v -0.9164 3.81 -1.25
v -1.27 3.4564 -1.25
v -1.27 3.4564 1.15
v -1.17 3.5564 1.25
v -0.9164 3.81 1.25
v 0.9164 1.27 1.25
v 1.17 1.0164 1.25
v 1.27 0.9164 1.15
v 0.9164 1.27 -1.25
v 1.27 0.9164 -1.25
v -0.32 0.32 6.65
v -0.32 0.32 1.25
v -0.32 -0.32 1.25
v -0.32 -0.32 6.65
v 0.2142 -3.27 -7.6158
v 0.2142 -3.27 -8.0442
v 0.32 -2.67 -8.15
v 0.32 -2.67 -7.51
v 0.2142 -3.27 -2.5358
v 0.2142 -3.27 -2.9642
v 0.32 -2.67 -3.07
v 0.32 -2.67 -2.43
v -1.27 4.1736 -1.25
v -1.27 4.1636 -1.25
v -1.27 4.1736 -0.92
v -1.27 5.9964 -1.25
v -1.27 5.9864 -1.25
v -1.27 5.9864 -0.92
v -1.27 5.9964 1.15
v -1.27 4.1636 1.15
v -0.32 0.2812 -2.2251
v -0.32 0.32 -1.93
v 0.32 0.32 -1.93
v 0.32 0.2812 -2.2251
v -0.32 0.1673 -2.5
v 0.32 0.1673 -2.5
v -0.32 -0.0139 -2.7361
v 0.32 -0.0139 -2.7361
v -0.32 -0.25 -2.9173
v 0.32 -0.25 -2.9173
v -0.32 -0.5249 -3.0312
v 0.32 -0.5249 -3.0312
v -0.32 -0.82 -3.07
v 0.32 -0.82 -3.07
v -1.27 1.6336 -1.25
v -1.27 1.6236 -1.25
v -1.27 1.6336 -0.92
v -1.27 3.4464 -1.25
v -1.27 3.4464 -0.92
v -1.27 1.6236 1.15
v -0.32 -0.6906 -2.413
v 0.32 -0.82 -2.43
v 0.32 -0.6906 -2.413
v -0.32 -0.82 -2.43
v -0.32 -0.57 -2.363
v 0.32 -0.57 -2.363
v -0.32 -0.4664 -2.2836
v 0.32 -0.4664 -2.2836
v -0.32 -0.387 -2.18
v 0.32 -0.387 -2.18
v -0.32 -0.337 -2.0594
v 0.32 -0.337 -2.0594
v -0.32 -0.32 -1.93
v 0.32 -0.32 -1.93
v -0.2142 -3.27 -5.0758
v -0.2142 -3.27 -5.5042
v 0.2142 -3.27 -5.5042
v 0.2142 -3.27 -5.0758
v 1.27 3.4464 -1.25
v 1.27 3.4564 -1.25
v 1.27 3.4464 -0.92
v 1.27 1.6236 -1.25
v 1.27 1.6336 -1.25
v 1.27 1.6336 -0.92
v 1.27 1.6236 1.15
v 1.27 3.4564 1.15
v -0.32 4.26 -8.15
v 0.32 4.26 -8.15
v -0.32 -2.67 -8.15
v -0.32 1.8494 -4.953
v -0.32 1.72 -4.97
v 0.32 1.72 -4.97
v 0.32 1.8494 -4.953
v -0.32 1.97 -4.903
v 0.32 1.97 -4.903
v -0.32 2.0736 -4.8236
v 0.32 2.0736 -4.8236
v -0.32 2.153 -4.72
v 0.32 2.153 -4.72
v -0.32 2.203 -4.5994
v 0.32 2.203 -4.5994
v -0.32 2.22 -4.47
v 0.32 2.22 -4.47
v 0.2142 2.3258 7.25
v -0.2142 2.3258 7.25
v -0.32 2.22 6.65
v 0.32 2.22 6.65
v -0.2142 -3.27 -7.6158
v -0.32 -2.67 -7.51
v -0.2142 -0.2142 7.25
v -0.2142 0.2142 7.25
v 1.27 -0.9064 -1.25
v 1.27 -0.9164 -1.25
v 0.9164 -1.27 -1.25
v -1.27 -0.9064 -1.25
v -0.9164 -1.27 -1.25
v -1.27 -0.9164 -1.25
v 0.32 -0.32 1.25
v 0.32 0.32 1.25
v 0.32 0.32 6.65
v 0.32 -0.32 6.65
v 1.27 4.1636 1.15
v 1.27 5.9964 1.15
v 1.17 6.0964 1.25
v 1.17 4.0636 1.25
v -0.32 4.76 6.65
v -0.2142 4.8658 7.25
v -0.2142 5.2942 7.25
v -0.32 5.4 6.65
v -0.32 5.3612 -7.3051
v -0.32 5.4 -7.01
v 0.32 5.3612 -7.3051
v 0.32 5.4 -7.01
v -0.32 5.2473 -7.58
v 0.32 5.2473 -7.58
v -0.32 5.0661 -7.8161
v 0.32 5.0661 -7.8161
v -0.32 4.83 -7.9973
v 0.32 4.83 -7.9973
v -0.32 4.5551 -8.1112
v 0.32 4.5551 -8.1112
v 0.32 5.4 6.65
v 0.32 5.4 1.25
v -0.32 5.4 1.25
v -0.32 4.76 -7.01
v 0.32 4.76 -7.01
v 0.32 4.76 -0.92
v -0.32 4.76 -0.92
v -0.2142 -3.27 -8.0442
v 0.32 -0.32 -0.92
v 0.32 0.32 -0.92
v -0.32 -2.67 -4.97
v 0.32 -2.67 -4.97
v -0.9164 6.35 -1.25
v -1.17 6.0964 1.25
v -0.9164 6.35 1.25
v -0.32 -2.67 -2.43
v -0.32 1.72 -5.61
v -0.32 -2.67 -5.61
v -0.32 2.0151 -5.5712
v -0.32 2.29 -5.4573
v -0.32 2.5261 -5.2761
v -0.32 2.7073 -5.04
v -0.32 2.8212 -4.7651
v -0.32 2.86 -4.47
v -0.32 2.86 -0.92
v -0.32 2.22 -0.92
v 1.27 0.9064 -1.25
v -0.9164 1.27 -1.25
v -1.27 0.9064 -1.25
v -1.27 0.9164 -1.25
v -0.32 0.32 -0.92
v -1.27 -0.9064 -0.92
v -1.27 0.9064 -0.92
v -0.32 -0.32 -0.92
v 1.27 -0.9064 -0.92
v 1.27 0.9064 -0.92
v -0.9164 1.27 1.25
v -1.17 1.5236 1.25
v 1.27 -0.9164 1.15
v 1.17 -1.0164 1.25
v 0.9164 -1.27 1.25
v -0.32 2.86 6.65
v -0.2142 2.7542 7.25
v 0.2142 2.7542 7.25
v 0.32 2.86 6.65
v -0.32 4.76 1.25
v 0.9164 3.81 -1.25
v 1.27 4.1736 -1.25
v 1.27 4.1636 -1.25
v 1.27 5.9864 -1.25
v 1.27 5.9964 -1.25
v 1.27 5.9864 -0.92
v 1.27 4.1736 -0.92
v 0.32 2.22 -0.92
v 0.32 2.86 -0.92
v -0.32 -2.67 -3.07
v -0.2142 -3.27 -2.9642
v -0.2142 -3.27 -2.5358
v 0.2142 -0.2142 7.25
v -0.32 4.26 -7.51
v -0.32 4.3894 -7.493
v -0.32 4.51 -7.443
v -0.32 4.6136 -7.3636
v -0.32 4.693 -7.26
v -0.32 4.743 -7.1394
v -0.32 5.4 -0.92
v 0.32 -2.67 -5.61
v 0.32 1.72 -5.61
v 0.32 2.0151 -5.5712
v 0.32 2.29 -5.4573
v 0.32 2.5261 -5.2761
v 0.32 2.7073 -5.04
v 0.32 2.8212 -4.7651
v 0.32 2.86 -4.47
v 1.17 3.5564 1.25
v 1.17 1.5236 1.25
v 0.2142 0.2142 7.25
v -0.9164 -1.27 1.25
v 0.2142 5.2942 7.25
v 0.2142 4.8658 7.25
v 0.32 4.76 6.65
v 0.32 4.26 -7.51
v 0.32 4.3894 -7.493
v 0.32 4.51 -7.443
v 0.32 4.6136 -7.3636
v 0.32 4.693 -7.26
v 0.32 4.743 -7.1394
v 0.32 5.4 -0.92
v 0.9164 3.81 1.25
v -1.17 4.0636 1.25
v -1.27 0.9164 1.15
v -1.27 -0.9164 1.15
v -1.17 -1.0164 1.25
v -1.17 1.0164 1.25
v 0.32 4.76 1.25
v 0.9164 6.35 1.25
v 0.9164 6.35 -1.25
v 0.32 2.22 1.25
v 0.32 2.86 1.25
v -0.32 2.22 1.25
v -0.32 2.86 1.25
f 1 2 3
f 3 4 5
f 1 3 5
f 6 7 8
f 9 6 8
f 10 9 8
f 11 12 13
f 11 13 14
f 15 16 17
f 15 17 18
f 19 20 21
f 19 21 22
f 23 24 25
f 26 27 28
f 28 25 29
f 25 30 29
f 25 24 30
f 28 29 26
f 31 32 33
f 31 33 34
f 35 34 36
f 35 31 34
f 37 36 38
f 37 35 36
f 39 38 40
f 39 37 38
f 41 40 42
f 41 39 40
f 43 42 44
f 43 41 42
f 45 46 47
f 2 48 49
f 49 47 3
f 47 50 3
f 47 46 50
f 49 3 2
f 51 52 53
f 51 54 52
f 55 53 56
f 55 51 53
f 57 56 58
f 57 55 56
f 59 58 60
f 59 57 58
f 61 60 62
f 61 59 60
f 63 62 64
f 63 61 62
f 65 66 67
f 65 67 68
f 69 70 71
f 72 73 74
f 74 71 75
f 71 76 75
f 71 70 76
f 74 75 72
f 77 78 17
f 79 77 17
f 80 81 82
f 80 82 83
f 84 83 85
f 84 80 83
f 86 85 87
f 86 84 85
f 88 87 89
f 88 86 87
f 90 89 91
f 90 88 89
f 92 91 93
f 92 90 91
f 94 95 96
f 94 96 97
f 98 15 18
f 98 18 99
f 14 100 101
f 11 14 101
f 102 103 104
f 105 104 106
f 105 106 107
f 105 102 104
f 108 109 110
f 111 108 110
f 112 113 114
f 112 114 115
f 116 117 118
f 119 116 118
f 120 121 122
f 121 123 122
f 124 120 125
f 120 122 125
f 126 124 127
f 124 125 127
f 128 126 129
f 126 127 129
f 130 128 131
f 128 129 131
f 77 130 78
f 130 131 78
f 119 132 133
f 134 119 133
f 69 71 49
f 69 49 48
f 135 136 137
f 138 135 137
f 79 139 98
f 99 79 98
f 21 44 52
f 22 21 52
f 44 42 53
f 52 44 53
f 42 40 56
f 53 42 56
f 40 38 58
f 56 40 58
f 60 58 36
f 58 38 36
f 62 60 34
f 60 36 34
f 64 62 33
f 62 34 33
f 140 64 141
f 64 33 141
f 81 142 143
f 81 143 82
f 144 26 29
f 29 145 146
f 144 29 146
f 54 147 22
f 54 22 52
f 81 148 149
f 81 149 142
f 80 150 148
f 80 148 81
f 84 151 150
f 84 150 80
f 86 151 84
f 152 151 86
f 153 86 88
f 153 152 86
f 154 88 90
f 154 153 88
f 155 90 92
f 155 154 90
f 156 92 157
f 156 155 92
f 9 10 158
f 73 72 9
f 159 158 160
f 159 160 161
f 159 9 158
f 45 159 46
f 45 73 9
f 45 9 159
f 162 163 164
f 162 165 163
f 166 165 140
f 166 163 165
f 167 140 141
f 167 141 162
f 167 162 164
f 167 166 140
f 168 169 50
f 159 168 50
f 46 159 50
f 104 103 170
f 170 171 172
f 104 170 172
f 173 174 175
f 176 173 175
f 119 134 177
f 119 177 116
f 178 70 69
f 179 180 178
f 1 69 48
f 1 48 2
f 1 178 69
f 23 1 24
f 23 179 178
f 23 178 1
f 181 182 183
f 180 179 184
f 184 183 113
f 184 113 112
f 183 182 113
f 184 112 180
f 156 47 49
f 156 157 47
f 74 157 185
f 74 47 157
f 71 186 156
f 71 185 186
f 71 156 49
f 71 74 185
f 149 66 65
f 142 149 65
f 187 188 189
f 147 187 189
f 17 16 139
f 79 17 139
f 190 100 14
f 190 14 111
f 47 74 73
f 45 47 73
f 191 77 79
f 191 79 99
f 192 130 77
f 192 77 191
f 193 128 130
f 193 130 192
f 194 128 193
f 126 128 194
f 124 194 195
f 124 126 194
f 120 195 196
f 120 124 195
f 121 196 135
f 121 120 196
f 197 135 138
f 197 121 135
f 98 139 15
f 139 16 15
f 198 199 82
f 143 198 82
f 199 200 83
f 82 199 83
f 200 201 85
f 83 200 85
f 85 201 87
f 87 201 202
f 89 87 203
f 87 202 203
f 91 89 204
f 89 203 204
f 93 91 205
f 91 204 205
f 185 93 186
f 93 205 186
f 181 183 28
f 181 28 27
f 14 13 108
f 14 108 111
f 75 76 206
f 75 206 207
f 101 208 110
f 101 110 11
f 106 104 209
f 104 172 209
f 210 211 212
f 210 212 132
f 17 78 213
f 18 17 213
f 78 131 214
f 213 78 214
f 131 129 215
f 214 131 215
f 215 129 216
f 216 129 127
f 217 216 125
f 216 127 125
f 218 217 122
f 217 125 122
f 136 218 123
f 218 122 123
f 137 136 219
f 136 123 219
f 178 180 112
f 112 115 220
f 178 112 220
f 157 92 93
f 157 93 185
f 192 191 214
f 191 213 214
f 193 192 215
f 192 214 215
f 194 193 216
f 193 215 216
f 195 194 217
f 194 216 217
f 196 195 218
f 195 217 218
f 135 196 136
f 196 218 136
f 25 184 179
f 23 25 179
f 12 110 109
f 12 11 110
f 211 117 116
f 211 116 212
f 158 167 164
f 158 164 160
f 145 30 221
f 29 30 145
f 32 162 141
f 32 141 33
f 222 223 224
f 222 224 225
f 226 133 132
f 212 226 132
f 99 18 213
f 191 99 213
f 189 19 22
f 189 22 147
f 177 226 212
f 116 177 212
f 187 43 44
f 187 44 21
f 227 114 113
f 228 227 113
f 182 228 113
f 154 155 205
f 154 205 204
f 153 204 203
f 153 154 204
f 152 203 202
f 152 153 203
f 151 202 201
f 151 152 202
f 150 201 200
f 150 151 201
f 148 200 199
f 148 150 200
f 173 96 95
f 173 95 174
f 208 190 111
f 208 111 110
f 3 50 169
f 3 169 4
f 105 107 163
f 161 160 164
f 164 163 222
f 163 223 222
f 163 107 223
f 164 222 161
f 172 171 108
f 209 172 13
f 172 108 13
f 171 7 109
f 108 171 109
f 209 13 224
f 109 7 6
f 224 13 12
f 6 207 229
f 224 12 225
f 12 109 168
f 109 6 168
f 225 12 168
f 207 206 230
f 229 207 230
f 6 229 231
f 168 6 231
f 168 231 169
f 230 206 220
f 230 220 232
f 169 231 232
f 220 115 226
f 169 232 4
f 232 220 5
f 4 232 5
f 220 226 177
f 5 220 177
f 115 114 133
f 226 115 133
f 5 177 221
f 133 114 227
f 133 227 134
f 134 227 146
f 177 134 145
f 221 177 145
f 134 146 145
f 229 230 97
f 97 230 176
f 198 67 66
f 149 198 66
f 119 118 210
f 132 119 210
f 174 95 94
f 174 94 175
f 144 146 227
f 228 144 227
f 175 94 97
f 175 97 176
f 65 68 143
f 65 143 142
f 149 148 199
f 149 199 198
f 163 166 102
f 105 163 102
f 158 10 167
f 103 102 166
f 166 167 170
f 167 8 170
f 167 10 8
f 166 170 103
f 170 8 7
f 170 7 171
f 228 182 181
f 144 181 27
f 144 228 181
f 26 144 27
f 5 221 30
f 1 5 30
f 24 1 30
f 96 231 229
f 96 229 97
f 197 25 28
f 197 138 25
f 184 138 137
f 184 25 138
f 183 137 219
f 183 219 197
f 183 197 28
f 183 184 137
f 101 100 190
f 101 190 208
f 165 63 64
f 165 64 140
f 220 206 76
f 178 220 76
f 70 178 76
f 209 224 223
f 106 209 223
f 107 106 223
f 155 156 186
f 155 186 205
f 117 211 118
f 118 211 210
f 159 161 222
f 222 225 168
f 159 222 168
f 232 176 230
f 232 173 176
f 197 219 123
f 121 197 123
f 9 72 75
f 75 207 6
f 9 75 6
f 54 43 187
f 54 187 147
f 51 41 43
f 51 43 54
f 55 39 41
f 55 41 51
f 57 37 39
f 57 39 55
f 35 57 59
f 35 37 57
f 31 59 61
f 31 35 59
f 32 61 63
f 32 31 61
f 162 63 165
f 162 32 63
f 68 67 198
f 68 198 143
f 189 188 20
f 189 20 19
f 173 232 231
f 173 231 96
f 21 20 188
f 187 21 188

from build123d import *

# Parameters (mm, degrees)
BOSS_EXTRU_1_DEPTH                      = 1.25
ESQUISSE2_W                             = 0.33
ESQUISSE2_H                             = 1.812893218
ENL_V_MAT_EXTRU_2_DEPTH                 = 3.54
CHANFREIN1_SIZE                         = 0.1
R_P_TITION_LIN_AIRE1_COUNT              = 3
R_P_TITION_LIN_AIRE1_PITCH              = 2.54
CHANFREIN1_OF_R_P_TITION_LIN_AIRE1_SIZE = 0.1
BOSS_EXTRU_2_DEPTH                      = 0.32
CHANFREIN2_SIZE                         = 0.6
CHANFREIN2_SIZE2                        = 0.105796188
CHANFREIN2_PART_2_SIZE                  = 0.6
CHANFREIN2_PART_2_SIZE2                 = 0.105796188
CHANFREIN2_PART_3_SIZE                  = 0.6
CHANFREIN2_PART_3_SIZE2                 = 0.105796188
CHANFREIN2_PART_4_SIZE                  = 0.6
CHANFREIN2_PART_4_SIZE2                 = 0.105796188
CHANFREIN2_PART_5_SIZE                  = 0.6
CHANFREIN2_PART_5_SIZE2                 = 0.105796188
CHANFREIN2_PART_6_SIZE                  = 0.6
CHANFREIN2_PART_6_SIZE2                 = 0.105796188
CHANFREIN2_PART_7_SIZE                  = 0.6
CHANFREIN2_PART_7_SIZE2                 = 0.105796188
CHANFREIN2_PART_8_SIZE                  = 0.6
CHANFREIN2_PART_8_SIZE2                 = 0.105796188
CHANFREIN2_PART_9_SIZE                  = 0.6
CHANFREIN2_PART_9_SIZE2                 = 0.105796188
CHANFREIN2_PART_10_SIZE                 = 0.6
CHANFREIN2_PART_10_SIZE2                = 0.105796188
CHANFREIN2_PART_11_SIZE                 = 0.6
CHANFREIN2_PART_11_SIZE2                = 0.105796188
CHANFREIN2_PART_12_SIZE                 = 0.6
CHANFREIN2_PART_12_SIZE2                = 0.105796188
CHANFREIN2_PART_13_SIZE                 = 0.6
CHANFREIN2_PART_13_SIZE2                = 0.105796188
CHANFREIN2_PART_14_SIZE                 = 0.6
CHANFREIN2_PART_14_SIZE2                = 0.105796188
CHANFREIN2_PART_15_SIZE                 = 0.6
CHANFREIN2_PART_15_SIZE2                = 0.105796188
CHANFREIN2_PART_16_SIZE                 = 0.6
CHANFREIN2_PART_16_SIZE2                = 0.105796188
CHANFREIN2_PART_17_SIZE                 = 0.6
CHANFREIN2_PART_17_SIZE2                = 0.105796188
CHANFREIN2_PART_18_SIZE                 = 0.6
CHANFREIN2_PART_18_SIZE2                = 0.105796188
CHANFREIN2_PART_19_SIZE                 = 0.6
CHANFREIN2_PART_19_SIZE2                = 0.105796188
CHANFREIN2_PART_20_SIZE                 = 0.6
CHANFREIN2_PART_20_SIZE2                = 0.105796188
CHANFREIN2_PART_21_SIZE                 = 0.6
CHANFREIN2_PART_21_SIZE2                = 0.105796188
CHANFREIN2_PART_22_SIZE                 = 0.6
CHANFREIN2_PART_22_SIZE2                = 0.105796188
CHANFREIN2_PART_23_SIZE                 = 0.6
CHANFREIN2_PART_23_SIZE2                = 0.105796188
CHANFREIN2_PART_24_SIZE                 = 0.6
CHANFREIN2_PART_24_SIZE2                = 0.105796188


with BuildPart() as part:
    # Esquisse1 → Boss.-Extru.1 (new body, symmetric)
    with BuildSketch(Plane.XY):
        Polygon((-0.916446609, 1.27), (0.916446609, 1.27), (1.27, 0.916446609), (1.27, -0.916446609), (0.916446609, -1.27), (-0.916446609, -1.27), (-1.27, -0.916446609), (-1.27, 0.916446609), align=None)
    boss_extru_1 = extrude(amount=BOSS_EXTRU_1_DEPTH, both=True)

    # Esquisse2 → Enlèv. mat.-Extru.2 (cut, through all)
    with BuildSketch(Plane(origin=(1.27, 0, 0), x_dir=(0, 0, -1), z_dir=(1, 0, 0))):
        with Locations((1.085, 0)):
            Rectangle(ESQUISSE2_W, ESQUISSE2_H)
    enl_v_mat_extru_2 = extrude(amount=-ENL_V_MAT_EXTRU_2_DEPTH, mode=Mode.SUBTRACT)

    # Chanfrein1
    chanfrein1_edges = [part.edges().sort_by_distance(p)[0] for p in [
        (1.27, 0, 1.25),
        (-1.27, 0, 1.25),
    ]]
    chamfer(chanfrein1_edges, length=CHANFREIN1_SIZE)

    # Répétition linéaire1: Boss.-Extru.1, Enlèv. mat.-Extru.2 ×3
    with Locations(*[(0, i * R_P_TITION_LIN_AIRE1_PITCH, 0) for i in range(1, R_P_TITION_LIN_AIRE1_COUNT)]):
        add(boss_extru_1)
        add(enl_v_mat_extru_2, mode=Mode.SUBTRACT)

    # Chanfrein1 of Répétition linéaire1
    chanfrein1_of_r_p_tition_lin_aire1_edges = [part.edges().sort_by_distance(p)[0] for p in [
        (1.27, 2.54, 1.25),
        (-1.27, 2.54, 1.25),
        (1.27, 5.08, 1.25),
        (-1.27, 5.08, 1.25),
    ]]
    chamfer(chanfrein1_of_r_p_tition_lin_aire1_edges, length=CHANFREIN1_OF_R_P_TITION_LIN_AIRE1_SIZE)

    # Esquisse3 → Boss.-Extru.2 (add, symmetric)
    with BuildSketch(Plane(origin=(0, 0, 0), x_dir=(0, 0, -1), z_dir=(1, 0, 0))):
        with BuildLine():
            Line((-7.25, -0.32), (-7.25, 0.32))
            Line((-7.25, 0.32), (1.93, 0.32))
            ThreePointArc((1.93, 0.32), (2.736101731, -0.013898269), (3.07, -0.82))
            Line((3.07, -0.82), (3.07, -3.27))
            Line((3.07, -3.27), (2.43, -3.27))
            Line((2.43, -3.27), (2.43, -0.82))
            ThreePointArc((2.43, -0.82), (2.283553391, -0.466446609), (1.93, -0.32))
            Line((1.93, -0.32), (-7.25, -0.32))
        make_face()
        with BuildLine():
            Line((-7.25, 2.86), (4.47, 2.86))
            ThreePointArc((4.47, 2.86), (5.276101731, 2.526101731), (5.61, 1.72))
            Line((5.61, 1.72), (5.61, -3.27))
            Line((5.61, -3.27), (4.97, -3.27))
            Line((4.97, -3.27), (4.97, 1.72))
            ThreePointArc((4.97, 1.72), (4.823553391, 2.073553391), (4.47, 2.22))
            Line((4.47, 2.22), (-7.25, 2.22))
            Line((-7.25, 2.22), (-7.25, 2.86))
        make_face()
        with BuildLine():
            Line((-7.25, 5.4), (7.01, 5.4))
            ThreePointArc((7.01, 5.4), (7.816101731, 5.066101731), (8.15, 4.26))
            Line((8.15, 4.26), (8.15, -3.27))
            Line((8.15, -3.27), (7.51, -3.27))
            Line((7.51, -3.27), (7.51, 4.26))
            ThreePointArc((7.51, 4.26), (7.363553391, 4.613553391), (7.01, 4.76))
            Line((7.01, 4.76), (-7.25, 4.76))
            Line((-7.25, 4.76), (-7.25, 5.4))
        make_face()
    extrude(amount=BOSS_EXTRU_2_DEPTH, both=True)

    # Chanfrein2
    chanfrein2_edges = [part.edges().sort_by_distance(p)[0] for p in [
        (0.32, -3.27, -2.75),
    ]]
    chanfrein2_side = [part.faces().sort_by_distance(p)[0] for p in [
        (0.32, -0.436857253, -2.313142747),
    ]]
    chamfer(chanfrein2_edges, length=CHANFREIN2_SIZE, length2=CHANFREIN2_SIZE2, reference=chanfrein2_side[0])

    # Chanfrein2 part 2
    chanfrein2_part_2_edges = [part.edges().sort_by_distance(p)[0] for p in [
        (0, -0.32, 7.25),
    ]]
    chanfrein2_part_2_side = [part.faces().sort_by_distance(p)[0] for p in [
        (0, -0.32, 4.25),
    ]]
    chamfer(chanfrein2_part_2_edges, length=CHANFREIN2_PART_2_SIZE, length2=CHANFREIN2_PART_2_SIZE2, reference=chanfrein2_part_2_side[0])

    # Chanfrein2 part 3
    chanfrein2_part_3_edges = [part.edges().sort_by_distance(p)[0] for p in [
        (-0.32, -3.27, -2.75),
    ]]
    chanfrein2_part_3_side = [part.faces().sort_by_distance(p)[0] for p in [
        (-0.32, -0.436857253, -2.313142747),
    ]]
    chamfer(chanfrein2_part_3_edges, length=CHANFREIN2_PART_3_SIZE, length2=CHANFREIN2_PART_3_SIZE2, reference=chanfrein2_part_3_side[0])

    # Chanfrein2 part 4
    chanfrein2_part_4_edges = [part.edges().sort_by_distance(p)[0] for p in [
        (0, -3.27, -2.43),
    ]]
    chanfrein2_part_4_side = [part.faces().sort_by_distance(p)[0] for p in [
        (0, -2.045, -2.43),
    ]]
    chamfer(chanfrein2_part_4_edges, length=CHANFREIN2_PART_4_SIZE, length2=CHANFREIN2_PART_4_SIZE2, reference=chanfrein2_part_4_side[0])

    # Chanfrein2 part 5
    chanfrein2_part_5_edges = [part.edges().sort_by_distance(p)[0] for p in [
        (0, -3.27, -3.07),
    ]]
    chanfrein2_part_5_side = [part.faces().sort_by_distance(p)[0] for p in [
        (0, -2.045, -3.07),
    ]]
    chamfer(chanfrein2_part_5_edges, length=CHANFREIN2_PART_5_SIZE, length2=CHANFREIN2_PART_5_SIZE2, reference=chanfrein2_part_5_side[0])

    # Chanfrein2 part 6
    chanfrein2_part_6_edges = [part.edges().sort_by_distance(p)[0] for p in [
        (-0.32, 0, 7.25),
    ]]
    chanfrein2_part_6_side = [part.faces().sort_by_distance(p)[0] for p in [
        (-0.32, 0, 4.25),
    ]]
    chamfer(chanfrein2_part_6_edges, length=CHANFREIN2_PART_6_SIZE, length2=CHANFREIN2_PART_6_SIZE2, reference=chanfrein2_part_6_side[0])

    # Chanfrein2 part 7
    chanfrein2_part_7_edges = [part.edges().sort_by_distance(p)[0] for p in [
        (0, 0.32, 7.25),
    ]]
    chanfrein2_part_7_side = [part.faces().sort_by_distance(p)[0] for p in [
        (0, 0.32, 4.25),
    ]]
    chamfer(chanfrein2_part_7_edges, length=CHANFREIN2_PART_7_SIZE, length2=CHANFREIN2_PART_7_SIZE2, reference=chanfrein2_part_7_side[0])

    # Chanfrein2 part 8
    chanfrein2_part_8_edges = [part.edges().sort_by_distance(p)[0] for p in [
        (0.32, 0, 7.25),
    ]]
    chanfrein2_part_8_side = [part.faces().sort_by_distance(p)[0] for p in [
        (0.32, 0, 4.25),
    ]]
    chamfer(chanfrein2_part_8_edges, length=CHANFREIN2_PART_8_SIZE, length2=CHANFREIN2_PART_8_SIZE2, reference=chanfrein2_part_8_side[0])

    # Chanfrein2 part 9
    chanfrein2_part_9_edges = [part.edges().sort_by_distance(p)[0] for p in [
        (0.32, -3.27, -5.29),
    ]]
    chanfrein2_part_9_side = [part.faces().sort_by_distance(p)[0] for p in [
        (0.32, 2.54, -0.997183547),
    ]]
    chamfer(chanfrein2_part_9_edges, length=CHANFREIN2_PART_9_SIZE, length2=CHANFREIN2_PART_9_SIZE2, reference=chanfrein2_part_9_side[0])

    # Chanfrein2 part 10
    chanfrein2_part_10_edges = [part.edges().sort_by_distance(p)[0] for p in [
        (0, 2.22, 7.25),
    ]]
    chanfrein2_part_10_side = [part.faces().sort_by_distance(p)[0] for p in [
        (0, 2.22, 4.25),
    ]]
    chamfer(chanfrein2_part_10_edges, length=CHANFREIN2_PART_10_SIZE, length2=CHANFREIN2_PART_10_SIZE2, reference=chanfrein2_part_10_side[0])

    # Chanfrein2 part 11
    chanfrein2_part_11_edges = [part.edges().sort_by_distance(p)[0] for p in [
        (-0.32, -3.27, -5.29),
    ]]
    chanfrein2_part_11_side = [part.faces().sort_by_distance(p)[0] for p in [
        (-0.32, 2.54, -0.997183547),
    ]]
    chamfer(chanfrein2_part_11_edges, length=CHANFREIN2_PART_11_SIZE, length2=CHANFREIN2_PART_11_SIZE2, reference=chanfrein2_part_11_side[0])

    # Chanfrein2 part 12
    chanfrein2_part_12_edges = [part.edges().sort_by_distance(p)[0] for p in [
        (0, -3.27, -4.97),
    ]]
    chanfrein2_part_12_side = [part.faces().sort_by_distance(p)[0] for p in [
        (0, -0.775, -4.97),
    ]]
    chamfer(chanfrein2_part_12_edges, length=CHANFREIN2_PART_12_SIZE, length2=CHANFREIN2_PART_12_SIZE2, reference=chanfrein2_part_12_side[0])

    # Chanfrein2 part 13
    chanfrein2_part_13_edges = [part.edges().sort_by_distance(p)[0] for p in [
        (0, -3.27, -5.61),
    ]]
    chanfrein2_part_13_side = [part.faces().sort_by_distance(p)[0] for p in [
        (0, -0.775, -5.61),
    ]]
    chamfer(chanfrein2_part_13_edges, length=CHANFREIN2_PART_13_SIZE, length2=CHANFREIN2_PART_13_SIZE2, reference=chanfrein2_part_13_side[0])

    # Chanfrein2 part 14
    chanfrein2_part_14_edges = [part.edges().sort_by_distance(p)[0] for p in [
        (-0.32, 2.54, 7.25),
    ]]
    chanfrein2_part_14_side = [part.faces().sort_by_distance(p)[0] for p in [
        (-0.32, 2.54, 4.25),
    ]]
    chamfer(chanfrein2_part_14_edges, length=CHANFREIN2_PART_14_SIZE, length2=CHANFREIN2_PART_14_SIZE2, reference=chanfrein2_part_14_side[0])

    # Chanfrein2 part 15
    chanfrein2_part_15_edges = [part.edges().sort_by_distance(p)[0] for p in [
        (0, 2.86, 7.25),
    ]]
    chanfrein2_part_15_side = [part.faces().sort_by_distance(p)[0] for p in [
        (0, 2.86, 4.25),
    ]]
    chamfer(chanfrein2_part_15_edges, length=CHANFREIN2_PART_15_SIZE, length2=CHANFREIN2_PART_15_SIZE2, reference=chanfrein2_part_15_side[0])

    # Chanfrein2 part 16
    chanfrein2_part_16_edges = [part.edges().sort_by_distance(p)[0] for p in [
        (0.32, 2.54, 7.25),
    ]]
    chanfrein2_part_16_side = [part.faces().sort_by_distance(p)[0] for p in [
        (0.32, 2.54, 4.25),
    ]]
    chamfer(chanfrein2_part_16_edges, length=CHANFREIN2_PART_16_SIZE, length2=CHANFREIN2_PART_16_SIZE2, reference=chanfrein2_part_16_side[0])

    # Chanfrein2 part 17
    chanfrein2_part_17_edges = [part.edges().sort_by_distance(p)[0] for p in [
        (0.32, -3.27, -7.83),
    ]]
    chanfrein2_part_17_side = [part.faces().sort_by_distance(p)[0] for p in [
        (0.32, 4.693378762, -7.443378762),
    ]]
    chamfer(chanfrein2_part_17_edges, length=CHANFREIN2_PART_17_SIZE, length2=CHANFREIN2_PART_17_SIZE2, reference=chanfrein2_part_17_side[0])

    # Chanfrein2 part 18
    chanfrein2_part_18_edges = [part.edges().sort_by_distance(p)[0] for p in [
        (0, 4.76, 7.25),
    ]]
    chanfrein2_part_18_side = [part.faces().sort_by_distance(p)[0] for p in [
        (0, 4.76, 4.25),
    ]]
    chamfer(chanfrein2_part_18_edges, length=CHANFREIN2_PART_18_SIZE, length2=CHANFREIN2_PART_18_SIZE2, reference=chanfrein2_part_18_side[0])

    # Chanfrein2 part 19
    chanfrein2_part_19_edges = [part.edges().sort_by_distance(p)[0] for p in [
        (-0.32, -3.27, -7.83),
    ]]
    chanfrein2_part_19_side = [part.faces().sort_by_distance(p)[0] for p in [
        (-0.32, 4.693378762, -7.443378762),
    ]]
    chamfer(chanfrein2_part_19_edges, length=CHANFREIN2_PART_19_SIZE, length2=CHANFREIN2_PART_19_SIZE2, reference=chanfrein2_part_19_side[0])

    # Chanfrein2 part 20
    chanfrein2_part_20_edges = [part.edges().sort_by_distance(p)[0] for p in [
        (0, -3.27, -7.51),
    ]]
    chanfrein2_part_20_side = [part.faces().sort_by_distance(p)[0] for p in [
        (0, 0.495, -7.51),
    ]]
    chamfer(chanfrein2_part_20_edges, length=CHANFREIN2_PART_20_SIZE, length2=CHANFREIN2_PART_20_SIZE2, reference=chanfrein2_part_20_side[0])

    # Chanfrein2 part 21
    chanfrein2_part_21_edges = [part.edges().sort_by_distance(p)[0] for p in [
        (0, -3.27, -8.15),
    ]]
    chanfrein2_part_21_side = [part.faces().sort_by_distance(p)[0] for p in [
        (0, 0.495, -8.15),
    ]]
    chamfer(chanfrein2_part_21_edges, length=CHANFREIN2_PART_21_SIZE, length2=CHANFREIN2_PART_21_SIZE2, reference=chanfrein2_part_21_side[0])

    # Chanfrein2 part 22
    chanfrein2_part_22_edges = [part.edges().sort_by_distance(p)[0] for p in [
        (-0.32, 5.08, 7.25),
    ]]
    chanfrein2_part_22_side = [part.faces().sort_by_distance(p)[0] for p in [
        (-0.32, 5.08, 4.25),
    ]]
    chamfer(chanfrein2_part_22_edges, length=CHANFREIN2_PART_22_SIZE, length2=CHANFREIN2_PART_22_SIZE2, reference=chanfrein2_part_22_side[0])

    # Chanfrein2 part 23
    chanfrein2_part_23_edges = [part.edges().sort_by_distance(p)[0] for p in [
        (0, 5.4, 7.25),
    ]]
    chanfrein2_part_23_side = [part.faces().sort_by_distance(p)[0] for p in [
        (0, 5.4, 4.25),
    ]]
    chamfer(chanfrein2_part_23_edges, length=CHANFREIN2_PART_23_SIZE, length2=CHANFREIN2_PART_23_SIZE2, reference=chanfrein2_part_23_side[0])

    # Chanfrein2 part 24
    chanfrein2_part_24_edges = [part.edges().sort_by_distance(p)[0] for p in [
        (0.32, 5.08, 7.25),
    ]]
    chanfrein2_part_24_side = [part.faces().sort_by_distance(p)[0] for p in [
        (0.32, 5.08, 4.25),
    ]]
    chamfer(chanfrein2_part_24_edges, length=CHANFREIN2_PART_24_SIZE, length2=CHANFREIN2_PART_24_SIZE2, reference=chanfrein2_part_24_side[0])


solid = part.part
